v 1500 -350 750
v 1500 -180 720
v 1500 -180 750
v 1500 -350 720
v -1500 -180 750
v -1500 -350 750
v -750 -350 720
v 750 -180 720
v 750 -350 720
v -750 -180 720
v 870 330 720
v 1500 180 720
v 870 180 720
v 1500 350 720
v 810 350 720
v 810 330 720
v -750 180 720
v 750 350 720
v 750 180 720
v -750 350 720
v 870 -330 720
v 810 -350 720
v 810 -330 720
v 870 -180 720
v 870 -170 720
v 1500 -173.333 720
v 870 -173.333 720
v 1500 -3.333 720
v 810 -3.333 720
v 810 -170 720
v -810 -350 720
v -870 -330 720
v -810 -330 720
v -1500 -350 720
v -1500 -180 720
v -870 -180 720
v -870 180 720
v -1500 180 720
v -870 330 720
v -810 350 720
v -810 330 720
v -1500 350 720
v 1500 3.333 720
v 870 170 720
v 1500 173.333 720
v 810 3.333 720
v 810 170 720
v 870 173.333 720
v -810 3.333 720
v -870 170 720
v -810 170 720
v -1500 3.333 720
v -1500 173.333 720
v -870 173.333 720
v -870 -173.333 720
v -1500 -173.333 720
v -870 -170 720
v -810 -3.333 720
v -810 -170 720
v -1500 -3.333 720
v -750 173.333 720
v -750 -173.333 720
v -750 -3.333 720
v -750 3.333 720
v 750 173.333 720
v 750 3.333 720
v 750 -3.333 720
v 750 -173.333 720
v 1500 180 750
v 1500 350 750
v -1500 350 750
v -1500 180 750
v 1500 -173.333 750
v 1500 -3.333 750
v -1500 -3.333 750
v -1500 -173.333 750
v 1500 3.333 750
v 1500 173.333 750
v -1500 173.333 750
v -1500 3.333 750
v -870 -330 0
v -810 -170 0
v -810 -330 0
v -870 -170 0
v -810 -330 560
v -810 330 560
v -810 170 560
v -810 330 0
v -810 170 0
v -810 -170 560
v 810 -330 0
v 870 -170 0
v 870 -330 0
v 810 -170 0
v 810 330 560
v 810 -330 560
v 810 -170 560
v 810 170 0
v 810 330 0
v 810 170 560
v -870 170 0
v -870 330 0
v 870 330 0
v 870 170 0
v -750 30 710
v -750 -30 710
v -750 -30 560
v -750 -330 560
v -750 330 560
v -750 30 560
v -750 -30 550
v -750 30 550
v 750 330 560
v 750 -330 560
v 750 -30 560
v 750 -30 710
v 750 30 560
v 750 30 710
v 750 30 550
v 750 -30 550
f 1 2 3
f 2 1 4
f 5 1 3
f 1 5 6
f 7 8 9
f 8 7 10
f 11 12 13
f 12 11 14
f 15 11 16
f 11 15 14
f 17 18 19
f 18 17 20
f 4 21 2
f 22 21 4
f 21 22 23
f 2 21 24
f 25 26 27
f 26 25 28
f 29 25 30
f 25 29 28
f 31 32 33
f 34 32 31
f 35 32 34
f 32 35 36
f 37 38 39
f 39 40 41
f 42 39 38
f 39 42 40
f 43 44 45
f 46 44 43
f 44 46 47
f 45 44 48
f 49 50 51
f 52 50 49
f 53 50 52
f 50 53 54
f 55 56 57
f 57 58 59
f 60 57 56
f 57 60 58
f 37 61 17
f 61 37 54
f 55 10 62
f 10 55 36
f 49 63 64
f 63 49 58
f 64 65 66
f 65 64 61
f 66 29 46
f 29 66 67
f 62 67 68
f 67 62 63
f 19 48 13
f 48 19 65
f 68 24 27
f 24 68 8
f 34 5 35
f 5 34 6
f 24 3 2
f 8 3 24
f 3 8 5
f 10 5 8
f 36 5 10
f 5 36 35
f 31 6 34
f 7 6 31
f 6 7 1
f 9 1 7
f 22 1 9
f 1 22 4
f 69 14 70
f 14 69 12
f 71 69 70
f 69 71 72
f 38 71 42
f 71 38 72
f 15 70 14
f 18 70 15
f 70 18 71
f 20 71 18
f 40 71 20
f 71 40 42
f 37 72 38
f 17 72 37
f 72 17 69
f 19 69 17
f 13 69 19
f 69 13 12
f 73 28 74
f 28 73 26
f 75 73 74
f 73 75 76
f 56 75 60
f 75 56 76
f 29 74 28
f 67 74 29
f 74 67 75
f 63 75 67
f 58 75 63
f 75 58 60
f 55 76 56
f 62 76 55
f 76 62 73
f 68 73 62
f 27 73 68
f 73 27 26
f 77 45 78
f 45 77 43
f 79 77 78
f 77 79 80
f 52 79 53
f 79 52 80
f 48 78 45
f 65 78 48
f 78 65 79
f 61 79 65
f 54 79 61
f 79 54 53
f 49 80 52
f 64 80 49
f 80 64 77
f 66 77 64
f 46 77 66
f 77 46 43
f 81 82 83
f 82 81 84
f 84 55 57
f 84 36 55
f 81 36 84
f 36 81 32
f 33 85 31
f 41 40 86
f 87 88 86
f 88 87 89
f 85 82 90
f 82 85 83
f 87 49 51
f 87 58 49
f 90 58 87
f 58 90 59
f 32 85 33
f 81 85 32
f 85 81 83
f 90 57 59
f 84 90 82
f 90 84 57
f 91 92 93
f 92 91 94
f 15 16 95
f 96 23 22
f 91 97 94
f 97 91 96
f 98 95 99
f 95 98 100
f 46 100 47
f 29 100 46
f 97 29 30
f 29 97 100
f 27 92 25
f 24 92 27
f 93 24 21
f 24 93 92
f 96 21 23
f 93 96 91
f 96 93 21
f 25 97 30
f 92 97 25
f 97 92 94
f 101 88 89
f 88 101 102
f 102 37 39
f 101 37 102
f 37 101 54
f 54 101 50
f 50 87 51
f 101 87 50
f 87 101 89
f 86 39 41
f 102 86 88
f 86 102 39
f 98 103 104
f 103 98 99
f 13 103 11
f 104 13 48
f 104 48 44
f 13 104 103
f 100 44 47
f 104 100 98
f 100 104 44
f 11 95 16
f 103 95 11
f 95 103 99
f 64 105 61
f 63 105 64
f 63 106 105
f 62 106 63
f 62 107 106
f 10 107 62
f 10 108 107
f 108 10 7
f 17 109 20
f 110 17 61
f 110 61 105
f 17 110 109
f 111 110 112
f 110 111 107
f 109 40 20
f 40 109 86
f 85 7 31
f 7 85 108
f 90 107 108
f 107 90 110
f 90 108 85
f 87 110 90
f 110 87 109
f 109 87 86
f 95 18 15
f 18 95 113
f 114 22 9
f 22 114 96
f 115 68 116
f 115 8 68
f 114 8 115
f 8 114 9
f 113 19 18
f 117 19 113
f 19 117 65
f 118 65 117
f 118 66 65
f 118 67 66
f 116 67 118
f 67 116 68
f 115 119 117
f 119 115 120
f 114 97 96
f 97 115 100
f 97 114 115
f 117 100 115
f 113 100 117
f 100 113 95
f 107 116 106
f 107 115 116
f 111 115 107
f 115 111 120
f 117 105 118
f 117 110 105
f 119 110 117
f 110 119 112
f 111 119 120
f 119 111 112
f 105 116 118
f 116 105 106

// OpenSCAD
/******************************************************************************!
 * \file table-de-jardin.scad
 * \author Sebastien Beaugrand
 * \sa http://beaugrand.chez.com/
 * \copyright CeCILL 2.1 Free Software license
 ******************************************************************************/
L=3000;  // Longueur plateau
l=700;   // Largeur plateau
T=1500;  // Longueur traverse
H=750;   // Hauteur
pb=160;  // Profondeur bastaing
eb=60;   // Epaisseur bastaing
pd=170;  // Profondeur demi-bastaing
ed=30;   // Epaisseur demi-bastaing
ec=20;   // Ecart plateau/poteau
module planche() { cube([L,pd,ed]); }
module poteau() { cube([H-ed,pb,eb]); }
module trapeze() {
  CubePoints = [
    [0,0,0 ],[l,0,0 ],[l-ec,pb,0 ],[ec,pb,0 ],
    [0,0,eb],[l,0,eb],[l-ec,pb,eb],[ec,pb,eb]];
  CubeFaces = [
    [0,1,2,3],[4,5,1,0],[7,6,5,4],
    [5,6,2,1],[6,7,3,2],[7,4,0,3]];
  polyhedron(CubePoints, CubeFaces);
}
module traverse() { cube([T,pb,eb]); }
translate([-L/2,-l/2,   H-ed]) planche();
translate([-L/2, l/2-pd,H-ed]) planche();
translate([-L/2,-(l-pd*4)/6-pd,H-ed]) planche();
translate([-L/2, (l-pd*4)/6,   H-ed]) planche();
translate([-T/2-eb,  -l/2+ec,   0]) rotate ([0,-90,0]) poteau();
translate([ T/2+eb*2,-l/2+ec,   0]) rotate ([0,-90,0]) poteau();
translate([-T/2-eb,   l/2-ec-pb,0]) rotate ([0,-90,0]) poteau();
translate([ T/2+eb*2, l/2-ec-pb,0]) rotate ([0,-90,0]) poteau();
translate([-T/2,   -l/2,H-ed]) rotate ([-90,0,90]) trapeze();
translate([ T/2+eb,-l/2,H-ed]) rotate ([-90,0,90]) trapeze();
translate([-T/2,eb/2,H-ed-pb-10]) rotate ([90,0,0]) traverse();
